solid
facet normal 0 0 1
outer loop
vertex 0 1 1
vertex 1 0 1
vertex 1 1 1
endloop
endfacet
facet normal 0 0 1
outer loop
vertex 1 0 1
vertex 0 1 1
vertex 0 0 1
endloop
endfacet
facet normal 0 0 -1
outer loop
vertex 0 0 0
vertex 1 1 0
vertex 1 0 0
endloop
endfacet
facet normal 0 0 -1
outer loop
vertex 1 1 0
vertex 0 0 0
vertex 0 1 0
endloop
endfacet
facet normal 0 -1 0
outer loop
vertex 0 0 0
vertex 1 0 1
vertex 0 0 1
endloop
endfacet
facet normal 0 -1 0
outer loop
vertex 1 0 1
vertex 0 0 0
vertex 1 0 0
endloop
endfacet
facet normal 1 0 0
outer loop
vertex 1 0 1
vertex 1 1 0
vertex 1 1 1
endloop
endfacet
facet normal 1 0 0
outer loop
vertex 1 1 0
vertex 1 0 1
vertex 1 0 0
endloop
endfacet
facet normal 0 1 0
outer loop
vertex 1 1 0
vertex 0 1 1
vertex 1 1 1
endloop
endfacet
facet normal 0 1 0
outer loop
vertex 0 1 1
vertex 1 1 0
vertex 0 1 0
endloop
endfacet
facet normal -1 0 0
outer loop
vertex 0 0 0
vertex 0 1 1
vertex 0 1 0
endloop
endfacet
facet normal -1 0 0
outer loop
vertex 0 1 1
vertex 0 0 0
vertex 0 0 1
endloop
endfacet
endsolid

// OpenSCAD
// an enclosure for a raspberry pi (model 1, 2, or 3) with a RaSCSI board and 
// a 2.5" laptop HDD connected via USB
// The particular drive I am using has a built-in USB interface, so there is
// no adapter required.

cube();
